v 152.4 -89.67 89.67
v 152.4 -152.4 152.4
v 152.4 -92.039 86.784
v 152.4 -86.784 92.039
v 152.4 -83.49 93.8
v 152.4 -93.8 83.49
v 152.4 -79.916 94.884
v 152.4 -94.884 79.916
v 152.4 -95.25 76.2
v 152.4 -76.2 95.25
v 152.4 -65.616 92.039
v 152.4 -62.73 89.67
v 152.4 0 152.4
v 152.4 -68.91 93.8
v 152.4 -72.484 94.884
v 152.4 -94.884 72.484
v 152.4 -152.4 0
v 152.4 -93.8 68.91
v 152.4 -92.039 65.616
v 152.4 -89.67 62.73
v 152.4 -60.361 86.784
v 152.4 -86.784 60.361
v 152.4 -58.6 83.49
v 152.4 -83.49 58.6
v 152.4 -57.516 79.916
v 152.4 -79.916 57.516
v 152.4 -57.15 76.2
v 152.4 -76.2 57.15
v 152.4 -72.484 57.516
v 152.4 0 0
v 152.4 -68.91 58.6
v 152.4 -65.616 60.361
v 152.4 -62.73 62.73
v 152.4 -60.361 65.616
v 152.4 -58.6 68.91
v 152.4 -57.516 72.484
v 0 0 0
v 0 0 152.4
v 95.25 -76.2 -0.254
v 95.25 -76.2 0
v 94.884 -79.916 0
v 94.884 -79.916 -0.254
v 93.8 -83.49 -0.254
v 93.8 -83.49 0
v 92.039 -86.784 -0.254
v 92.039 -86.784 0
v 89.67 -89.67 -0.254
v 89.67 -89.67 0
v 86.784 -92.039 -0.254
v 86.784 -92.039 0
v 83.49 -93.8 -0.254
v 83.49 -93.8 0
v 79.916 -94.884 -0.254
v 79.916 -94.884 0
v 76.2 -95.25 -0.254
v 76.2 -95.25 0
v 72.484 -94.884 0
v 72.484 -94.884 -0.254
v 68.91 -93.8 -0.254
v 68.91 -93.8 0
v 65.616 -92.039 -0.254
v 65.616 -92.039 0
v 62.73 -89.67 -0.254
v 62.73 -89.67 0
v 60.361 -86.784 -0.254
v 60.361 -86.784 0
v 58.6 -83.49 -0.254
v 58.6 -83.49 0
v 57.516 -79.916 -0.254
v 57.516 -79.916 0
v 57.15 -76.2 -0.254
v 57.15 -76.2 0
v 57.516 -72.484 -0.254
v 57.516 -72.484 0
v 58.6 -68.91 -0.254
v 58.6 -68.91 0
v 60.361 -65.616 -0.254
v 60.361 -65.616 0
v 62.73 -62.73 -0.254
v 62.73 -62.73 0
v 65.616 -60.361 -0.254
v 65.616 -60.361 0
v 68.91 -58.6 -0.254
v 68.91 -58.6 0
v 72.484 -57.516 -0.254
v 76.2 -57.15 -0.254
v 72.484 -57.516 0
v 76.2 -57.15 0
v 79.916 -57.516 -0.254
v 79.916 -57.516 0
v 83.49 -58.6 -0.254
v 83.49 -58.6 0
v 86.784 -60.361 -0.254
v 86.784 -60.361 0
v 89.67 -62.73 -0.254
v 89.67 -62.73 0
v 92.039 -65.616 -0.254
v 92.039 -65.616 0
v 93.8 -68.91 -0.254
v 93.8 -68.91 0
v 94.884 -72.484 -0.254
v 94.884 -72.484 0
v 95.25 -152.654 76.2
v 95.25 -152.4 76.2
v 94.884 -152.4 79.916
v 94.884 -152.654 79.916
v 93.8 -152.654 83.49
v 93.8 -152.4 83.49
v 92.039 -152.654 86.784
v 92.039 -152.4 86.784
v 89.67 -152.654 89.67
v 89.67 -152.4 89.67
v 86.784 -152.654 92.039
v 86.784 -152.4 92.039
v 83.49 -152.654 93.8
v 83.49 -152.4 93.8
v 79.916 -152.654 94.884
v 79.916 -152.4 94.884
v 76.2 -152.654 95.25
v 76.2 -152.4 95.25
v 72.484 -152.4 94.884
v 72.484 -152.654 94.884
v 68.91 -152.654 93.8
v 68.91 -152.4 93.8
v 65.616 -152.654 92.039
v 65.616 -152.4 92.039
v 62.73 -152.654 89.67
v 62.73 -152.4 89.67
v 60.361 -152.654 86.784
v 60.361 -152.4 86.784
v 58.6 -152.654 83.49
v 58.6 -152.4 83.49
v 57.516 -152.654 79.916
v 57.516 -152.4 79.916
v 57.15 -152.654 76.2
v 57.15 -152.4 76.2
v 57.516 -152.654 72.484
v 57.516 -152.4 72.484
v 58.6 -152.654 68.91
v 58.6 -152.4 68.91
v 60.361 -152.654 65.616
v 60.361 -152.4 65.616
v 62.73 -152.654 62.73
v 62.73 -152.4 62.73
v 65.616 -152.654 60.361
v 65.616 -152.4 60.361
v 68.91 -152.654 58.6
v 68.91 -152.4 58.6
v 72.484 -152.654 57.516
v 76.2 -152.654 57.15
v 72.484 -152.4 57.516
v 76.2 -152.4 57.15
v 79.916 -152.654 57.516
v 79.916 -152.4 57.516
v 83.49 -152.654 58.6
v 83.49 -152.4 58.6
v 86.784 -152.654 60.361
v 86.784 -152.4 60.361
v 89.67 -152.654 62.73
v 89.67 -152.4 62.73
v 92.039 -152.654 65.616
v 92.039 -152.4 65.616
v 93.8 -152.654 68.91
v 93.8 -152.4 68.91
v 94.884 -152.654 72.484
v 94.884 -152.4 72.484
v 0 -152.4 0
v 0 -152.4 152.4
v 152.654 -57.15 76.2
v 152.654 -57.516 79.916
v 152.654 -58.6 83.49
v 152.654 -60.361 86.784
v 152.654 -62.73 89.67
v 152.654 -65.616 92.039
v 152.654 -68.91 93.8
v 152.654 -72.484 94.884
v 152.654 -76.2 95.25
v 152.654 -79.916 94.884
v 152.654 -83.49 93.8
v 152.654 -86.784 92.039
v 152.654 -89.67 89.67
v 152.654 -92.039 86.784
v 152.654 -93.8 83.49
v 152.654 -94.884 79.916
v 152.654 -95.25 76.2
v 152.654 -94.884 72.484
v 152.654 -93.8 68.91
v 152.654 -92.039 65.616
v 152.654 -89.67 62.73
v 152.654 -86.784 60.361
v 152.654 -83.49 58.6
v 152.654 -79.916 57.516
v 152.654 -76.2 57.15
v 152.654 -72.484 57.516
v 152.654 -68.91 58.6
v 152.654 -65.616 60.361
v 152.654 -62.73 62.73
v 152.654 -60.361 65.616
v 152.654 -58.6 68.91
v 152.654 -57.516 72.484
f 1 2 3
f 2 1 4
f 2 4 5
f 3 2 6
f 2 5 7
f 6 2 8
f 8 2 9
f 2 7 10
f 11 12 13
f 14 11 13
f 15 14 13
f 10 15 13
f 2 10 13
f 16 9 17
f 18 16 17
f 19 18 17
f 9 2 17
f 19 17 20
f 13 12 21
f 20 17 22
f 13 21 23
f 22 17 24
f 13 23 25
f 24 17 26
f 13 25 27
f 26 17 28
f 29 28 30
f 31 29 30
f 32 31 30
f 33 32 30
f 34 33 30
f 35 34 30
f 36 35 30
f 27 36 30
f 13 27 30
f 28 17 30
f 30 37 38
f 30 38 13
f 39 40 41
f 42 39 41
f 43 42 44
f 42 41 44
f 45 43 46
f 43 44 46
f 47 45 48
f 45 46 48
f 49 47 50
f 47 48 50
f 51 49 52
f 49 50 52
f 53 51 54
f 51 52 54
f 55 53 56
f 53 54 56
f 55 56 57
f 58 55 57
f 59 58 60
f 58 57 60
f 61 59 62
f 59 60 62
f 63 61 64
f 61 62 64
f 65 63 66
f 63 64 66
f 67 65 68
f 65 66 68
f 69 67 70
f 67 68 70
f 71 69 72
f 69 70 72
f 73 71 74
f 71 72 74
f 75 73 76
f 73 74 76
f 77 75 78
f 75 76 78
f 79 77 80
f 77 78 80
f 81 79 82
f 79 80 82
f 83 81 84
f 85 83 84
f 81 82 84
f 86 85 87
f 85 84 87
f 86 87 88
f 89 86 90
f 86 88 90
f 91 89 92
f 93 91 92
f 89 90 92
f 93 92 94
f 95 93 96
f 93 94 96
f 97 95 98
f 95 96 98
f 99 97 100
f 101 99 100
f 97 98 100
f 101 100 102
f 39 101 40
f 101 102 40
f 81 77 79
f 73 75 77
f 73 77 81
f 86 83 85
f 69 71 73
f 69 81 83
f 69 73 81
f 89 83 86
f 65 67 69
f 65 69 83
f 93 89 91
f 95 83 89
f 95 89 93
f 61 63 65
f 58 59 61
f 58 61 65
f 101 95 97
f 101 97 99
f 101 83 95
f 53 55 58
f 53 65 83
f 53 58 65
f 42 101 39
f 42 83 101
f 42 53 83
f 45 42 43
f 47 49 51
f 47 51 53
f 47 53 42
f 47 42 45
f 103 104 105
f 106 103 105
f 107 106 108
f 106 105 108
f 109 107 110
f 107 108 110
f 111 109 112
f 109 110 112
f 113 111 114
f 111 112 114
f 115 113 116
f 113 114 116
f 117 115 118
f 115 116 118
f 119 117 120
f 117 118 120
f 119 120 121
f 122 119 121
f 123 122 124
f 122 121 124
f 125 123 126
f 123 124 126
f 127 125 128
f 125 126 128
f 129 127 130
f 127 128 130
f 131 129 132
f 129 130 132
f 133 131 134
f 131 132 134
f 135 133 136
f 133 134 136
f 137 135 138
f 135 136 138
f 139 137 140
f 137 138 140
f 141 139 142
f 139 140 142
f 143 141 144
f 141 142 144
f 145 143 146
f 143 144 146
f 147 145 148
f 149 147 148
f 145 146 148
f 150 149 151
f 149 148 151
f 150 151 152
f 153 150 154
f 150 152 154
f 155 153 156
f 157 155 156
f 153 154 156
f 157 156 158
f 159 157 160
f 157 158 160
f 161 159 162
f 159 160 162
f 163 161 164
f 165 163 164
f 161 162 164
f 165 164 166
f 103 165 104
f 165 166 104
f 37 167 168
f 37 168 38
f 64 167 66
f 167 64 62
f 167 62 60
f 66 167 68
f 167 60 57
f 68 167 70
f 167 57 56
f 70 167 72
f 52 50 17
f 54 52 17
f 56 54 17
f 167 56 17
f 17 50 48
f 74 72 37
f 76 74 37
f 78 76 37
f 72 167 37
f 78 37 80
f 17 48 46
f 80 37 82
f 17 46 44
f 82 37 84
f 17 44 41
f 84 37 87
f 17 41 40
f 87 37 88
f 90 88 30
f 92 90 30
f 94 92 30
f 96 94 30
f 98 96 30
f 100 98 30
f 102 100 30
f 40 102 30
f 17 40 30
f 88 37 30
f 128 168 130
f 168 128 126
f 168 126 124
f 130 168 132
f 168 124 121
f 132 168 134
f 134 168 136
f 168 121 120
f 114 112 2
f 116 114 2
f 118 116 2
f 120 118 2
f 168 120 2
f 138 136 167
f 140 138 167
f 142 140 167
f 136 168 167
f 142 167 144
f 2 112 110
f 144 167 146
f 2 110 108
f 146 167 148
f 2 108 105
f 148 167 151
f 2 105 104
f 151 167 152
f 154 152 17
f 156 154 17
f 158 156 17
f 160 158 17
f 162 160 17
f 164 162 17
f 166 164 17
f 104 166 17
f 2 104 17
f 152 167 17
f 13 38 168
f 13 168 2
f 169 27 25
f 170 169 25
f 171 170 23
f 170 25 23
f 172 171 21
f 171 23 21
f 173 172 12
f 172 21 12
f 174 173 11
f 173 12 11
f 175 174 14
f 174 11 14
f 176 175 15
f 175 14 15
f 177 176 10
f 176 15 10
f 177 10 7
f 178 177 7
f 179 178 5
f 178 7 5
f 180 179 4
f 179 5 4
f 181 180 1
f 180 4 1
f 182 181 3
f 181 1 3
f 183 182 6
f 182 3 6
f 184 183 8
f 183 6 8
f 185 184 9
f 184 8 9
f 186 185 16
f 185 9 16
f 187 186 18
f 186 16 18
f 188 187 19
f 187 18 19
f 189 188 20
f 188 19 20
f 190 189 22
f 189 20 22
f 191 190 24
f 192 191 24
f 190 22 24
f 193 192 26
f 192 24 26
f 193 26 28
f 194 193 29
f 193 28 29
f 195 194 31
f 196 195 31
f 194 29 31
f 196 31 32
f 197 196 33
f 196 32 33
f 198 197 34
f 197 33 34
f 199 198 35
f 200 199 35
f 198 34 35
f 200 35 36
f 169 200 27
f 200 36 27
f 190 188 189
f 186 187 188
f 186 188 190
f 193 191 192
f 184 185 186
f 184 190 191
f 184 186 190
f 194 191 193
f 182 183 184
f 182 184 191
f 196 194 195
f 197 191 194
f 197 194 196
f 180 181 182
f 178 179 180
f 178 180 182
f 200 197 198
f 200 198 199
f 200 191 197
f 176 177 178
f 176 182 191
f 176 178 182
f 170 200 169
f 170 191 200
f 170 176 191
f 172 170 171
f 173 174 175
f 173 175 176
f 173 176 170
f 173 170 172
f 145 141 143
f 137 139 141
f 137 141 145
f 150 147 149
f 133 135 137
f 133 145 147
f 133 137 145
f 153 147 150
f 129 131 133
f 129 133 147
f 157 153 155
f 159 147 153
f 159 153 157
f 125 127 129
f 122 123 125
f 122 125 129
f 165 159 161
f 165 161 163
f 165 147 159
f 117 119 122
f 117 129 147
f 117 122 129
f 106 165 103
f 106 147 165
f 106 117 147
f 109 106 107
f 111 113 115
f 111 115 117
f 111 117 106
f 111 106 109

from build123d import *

# Parameters (mm, degrees)
F0_W     = 152.4
F0_H     = 152.4
F1_DEPTH = 152.4
F2_R     = 19.05
F3_DEPTH = 0.254
F4_R     = 19.05
F5_DEPTH = 0.254
F6_R     = 19.05
F7_DEPTH = 0.254


with BuildPart() as f1:
    # F0 (on Top) → F1 (new body)
    with BuildSketch(Plane.XY):
        with Locations((76.2, -76.2)):
            Rectangle(F0_W, F0_H)
    extrude(amount=F1_DEPTH)

    # F2 (on face) → F3 (join)
    with BuildSketch(Plane.XZ.offset(152.4)):
        with Locations((76.2, 76.2)):
            Circle(F2_R)
    extrude(amount=F3_DEPTH)

    # F4 (on face) → F5 (join)
    with BuildSketch(Plane.YZ.offset(152.4)):
        with Locations((-76.2, 76.2)):
            Circle(F4_R)
    extrude(amount=F5_DEPTH)

    # F6 (on face) → F7 (join)
    with BuildSketch(Plane(origin=(0, 0, 0), x_dir=(1, 0, 0), z_dir=(0, 0, -1))):
        with Locations((76.2, 76.2)):
            Circle(F6_R)
    extrude(amount=F7_DEPTH)


solid = f1.part
